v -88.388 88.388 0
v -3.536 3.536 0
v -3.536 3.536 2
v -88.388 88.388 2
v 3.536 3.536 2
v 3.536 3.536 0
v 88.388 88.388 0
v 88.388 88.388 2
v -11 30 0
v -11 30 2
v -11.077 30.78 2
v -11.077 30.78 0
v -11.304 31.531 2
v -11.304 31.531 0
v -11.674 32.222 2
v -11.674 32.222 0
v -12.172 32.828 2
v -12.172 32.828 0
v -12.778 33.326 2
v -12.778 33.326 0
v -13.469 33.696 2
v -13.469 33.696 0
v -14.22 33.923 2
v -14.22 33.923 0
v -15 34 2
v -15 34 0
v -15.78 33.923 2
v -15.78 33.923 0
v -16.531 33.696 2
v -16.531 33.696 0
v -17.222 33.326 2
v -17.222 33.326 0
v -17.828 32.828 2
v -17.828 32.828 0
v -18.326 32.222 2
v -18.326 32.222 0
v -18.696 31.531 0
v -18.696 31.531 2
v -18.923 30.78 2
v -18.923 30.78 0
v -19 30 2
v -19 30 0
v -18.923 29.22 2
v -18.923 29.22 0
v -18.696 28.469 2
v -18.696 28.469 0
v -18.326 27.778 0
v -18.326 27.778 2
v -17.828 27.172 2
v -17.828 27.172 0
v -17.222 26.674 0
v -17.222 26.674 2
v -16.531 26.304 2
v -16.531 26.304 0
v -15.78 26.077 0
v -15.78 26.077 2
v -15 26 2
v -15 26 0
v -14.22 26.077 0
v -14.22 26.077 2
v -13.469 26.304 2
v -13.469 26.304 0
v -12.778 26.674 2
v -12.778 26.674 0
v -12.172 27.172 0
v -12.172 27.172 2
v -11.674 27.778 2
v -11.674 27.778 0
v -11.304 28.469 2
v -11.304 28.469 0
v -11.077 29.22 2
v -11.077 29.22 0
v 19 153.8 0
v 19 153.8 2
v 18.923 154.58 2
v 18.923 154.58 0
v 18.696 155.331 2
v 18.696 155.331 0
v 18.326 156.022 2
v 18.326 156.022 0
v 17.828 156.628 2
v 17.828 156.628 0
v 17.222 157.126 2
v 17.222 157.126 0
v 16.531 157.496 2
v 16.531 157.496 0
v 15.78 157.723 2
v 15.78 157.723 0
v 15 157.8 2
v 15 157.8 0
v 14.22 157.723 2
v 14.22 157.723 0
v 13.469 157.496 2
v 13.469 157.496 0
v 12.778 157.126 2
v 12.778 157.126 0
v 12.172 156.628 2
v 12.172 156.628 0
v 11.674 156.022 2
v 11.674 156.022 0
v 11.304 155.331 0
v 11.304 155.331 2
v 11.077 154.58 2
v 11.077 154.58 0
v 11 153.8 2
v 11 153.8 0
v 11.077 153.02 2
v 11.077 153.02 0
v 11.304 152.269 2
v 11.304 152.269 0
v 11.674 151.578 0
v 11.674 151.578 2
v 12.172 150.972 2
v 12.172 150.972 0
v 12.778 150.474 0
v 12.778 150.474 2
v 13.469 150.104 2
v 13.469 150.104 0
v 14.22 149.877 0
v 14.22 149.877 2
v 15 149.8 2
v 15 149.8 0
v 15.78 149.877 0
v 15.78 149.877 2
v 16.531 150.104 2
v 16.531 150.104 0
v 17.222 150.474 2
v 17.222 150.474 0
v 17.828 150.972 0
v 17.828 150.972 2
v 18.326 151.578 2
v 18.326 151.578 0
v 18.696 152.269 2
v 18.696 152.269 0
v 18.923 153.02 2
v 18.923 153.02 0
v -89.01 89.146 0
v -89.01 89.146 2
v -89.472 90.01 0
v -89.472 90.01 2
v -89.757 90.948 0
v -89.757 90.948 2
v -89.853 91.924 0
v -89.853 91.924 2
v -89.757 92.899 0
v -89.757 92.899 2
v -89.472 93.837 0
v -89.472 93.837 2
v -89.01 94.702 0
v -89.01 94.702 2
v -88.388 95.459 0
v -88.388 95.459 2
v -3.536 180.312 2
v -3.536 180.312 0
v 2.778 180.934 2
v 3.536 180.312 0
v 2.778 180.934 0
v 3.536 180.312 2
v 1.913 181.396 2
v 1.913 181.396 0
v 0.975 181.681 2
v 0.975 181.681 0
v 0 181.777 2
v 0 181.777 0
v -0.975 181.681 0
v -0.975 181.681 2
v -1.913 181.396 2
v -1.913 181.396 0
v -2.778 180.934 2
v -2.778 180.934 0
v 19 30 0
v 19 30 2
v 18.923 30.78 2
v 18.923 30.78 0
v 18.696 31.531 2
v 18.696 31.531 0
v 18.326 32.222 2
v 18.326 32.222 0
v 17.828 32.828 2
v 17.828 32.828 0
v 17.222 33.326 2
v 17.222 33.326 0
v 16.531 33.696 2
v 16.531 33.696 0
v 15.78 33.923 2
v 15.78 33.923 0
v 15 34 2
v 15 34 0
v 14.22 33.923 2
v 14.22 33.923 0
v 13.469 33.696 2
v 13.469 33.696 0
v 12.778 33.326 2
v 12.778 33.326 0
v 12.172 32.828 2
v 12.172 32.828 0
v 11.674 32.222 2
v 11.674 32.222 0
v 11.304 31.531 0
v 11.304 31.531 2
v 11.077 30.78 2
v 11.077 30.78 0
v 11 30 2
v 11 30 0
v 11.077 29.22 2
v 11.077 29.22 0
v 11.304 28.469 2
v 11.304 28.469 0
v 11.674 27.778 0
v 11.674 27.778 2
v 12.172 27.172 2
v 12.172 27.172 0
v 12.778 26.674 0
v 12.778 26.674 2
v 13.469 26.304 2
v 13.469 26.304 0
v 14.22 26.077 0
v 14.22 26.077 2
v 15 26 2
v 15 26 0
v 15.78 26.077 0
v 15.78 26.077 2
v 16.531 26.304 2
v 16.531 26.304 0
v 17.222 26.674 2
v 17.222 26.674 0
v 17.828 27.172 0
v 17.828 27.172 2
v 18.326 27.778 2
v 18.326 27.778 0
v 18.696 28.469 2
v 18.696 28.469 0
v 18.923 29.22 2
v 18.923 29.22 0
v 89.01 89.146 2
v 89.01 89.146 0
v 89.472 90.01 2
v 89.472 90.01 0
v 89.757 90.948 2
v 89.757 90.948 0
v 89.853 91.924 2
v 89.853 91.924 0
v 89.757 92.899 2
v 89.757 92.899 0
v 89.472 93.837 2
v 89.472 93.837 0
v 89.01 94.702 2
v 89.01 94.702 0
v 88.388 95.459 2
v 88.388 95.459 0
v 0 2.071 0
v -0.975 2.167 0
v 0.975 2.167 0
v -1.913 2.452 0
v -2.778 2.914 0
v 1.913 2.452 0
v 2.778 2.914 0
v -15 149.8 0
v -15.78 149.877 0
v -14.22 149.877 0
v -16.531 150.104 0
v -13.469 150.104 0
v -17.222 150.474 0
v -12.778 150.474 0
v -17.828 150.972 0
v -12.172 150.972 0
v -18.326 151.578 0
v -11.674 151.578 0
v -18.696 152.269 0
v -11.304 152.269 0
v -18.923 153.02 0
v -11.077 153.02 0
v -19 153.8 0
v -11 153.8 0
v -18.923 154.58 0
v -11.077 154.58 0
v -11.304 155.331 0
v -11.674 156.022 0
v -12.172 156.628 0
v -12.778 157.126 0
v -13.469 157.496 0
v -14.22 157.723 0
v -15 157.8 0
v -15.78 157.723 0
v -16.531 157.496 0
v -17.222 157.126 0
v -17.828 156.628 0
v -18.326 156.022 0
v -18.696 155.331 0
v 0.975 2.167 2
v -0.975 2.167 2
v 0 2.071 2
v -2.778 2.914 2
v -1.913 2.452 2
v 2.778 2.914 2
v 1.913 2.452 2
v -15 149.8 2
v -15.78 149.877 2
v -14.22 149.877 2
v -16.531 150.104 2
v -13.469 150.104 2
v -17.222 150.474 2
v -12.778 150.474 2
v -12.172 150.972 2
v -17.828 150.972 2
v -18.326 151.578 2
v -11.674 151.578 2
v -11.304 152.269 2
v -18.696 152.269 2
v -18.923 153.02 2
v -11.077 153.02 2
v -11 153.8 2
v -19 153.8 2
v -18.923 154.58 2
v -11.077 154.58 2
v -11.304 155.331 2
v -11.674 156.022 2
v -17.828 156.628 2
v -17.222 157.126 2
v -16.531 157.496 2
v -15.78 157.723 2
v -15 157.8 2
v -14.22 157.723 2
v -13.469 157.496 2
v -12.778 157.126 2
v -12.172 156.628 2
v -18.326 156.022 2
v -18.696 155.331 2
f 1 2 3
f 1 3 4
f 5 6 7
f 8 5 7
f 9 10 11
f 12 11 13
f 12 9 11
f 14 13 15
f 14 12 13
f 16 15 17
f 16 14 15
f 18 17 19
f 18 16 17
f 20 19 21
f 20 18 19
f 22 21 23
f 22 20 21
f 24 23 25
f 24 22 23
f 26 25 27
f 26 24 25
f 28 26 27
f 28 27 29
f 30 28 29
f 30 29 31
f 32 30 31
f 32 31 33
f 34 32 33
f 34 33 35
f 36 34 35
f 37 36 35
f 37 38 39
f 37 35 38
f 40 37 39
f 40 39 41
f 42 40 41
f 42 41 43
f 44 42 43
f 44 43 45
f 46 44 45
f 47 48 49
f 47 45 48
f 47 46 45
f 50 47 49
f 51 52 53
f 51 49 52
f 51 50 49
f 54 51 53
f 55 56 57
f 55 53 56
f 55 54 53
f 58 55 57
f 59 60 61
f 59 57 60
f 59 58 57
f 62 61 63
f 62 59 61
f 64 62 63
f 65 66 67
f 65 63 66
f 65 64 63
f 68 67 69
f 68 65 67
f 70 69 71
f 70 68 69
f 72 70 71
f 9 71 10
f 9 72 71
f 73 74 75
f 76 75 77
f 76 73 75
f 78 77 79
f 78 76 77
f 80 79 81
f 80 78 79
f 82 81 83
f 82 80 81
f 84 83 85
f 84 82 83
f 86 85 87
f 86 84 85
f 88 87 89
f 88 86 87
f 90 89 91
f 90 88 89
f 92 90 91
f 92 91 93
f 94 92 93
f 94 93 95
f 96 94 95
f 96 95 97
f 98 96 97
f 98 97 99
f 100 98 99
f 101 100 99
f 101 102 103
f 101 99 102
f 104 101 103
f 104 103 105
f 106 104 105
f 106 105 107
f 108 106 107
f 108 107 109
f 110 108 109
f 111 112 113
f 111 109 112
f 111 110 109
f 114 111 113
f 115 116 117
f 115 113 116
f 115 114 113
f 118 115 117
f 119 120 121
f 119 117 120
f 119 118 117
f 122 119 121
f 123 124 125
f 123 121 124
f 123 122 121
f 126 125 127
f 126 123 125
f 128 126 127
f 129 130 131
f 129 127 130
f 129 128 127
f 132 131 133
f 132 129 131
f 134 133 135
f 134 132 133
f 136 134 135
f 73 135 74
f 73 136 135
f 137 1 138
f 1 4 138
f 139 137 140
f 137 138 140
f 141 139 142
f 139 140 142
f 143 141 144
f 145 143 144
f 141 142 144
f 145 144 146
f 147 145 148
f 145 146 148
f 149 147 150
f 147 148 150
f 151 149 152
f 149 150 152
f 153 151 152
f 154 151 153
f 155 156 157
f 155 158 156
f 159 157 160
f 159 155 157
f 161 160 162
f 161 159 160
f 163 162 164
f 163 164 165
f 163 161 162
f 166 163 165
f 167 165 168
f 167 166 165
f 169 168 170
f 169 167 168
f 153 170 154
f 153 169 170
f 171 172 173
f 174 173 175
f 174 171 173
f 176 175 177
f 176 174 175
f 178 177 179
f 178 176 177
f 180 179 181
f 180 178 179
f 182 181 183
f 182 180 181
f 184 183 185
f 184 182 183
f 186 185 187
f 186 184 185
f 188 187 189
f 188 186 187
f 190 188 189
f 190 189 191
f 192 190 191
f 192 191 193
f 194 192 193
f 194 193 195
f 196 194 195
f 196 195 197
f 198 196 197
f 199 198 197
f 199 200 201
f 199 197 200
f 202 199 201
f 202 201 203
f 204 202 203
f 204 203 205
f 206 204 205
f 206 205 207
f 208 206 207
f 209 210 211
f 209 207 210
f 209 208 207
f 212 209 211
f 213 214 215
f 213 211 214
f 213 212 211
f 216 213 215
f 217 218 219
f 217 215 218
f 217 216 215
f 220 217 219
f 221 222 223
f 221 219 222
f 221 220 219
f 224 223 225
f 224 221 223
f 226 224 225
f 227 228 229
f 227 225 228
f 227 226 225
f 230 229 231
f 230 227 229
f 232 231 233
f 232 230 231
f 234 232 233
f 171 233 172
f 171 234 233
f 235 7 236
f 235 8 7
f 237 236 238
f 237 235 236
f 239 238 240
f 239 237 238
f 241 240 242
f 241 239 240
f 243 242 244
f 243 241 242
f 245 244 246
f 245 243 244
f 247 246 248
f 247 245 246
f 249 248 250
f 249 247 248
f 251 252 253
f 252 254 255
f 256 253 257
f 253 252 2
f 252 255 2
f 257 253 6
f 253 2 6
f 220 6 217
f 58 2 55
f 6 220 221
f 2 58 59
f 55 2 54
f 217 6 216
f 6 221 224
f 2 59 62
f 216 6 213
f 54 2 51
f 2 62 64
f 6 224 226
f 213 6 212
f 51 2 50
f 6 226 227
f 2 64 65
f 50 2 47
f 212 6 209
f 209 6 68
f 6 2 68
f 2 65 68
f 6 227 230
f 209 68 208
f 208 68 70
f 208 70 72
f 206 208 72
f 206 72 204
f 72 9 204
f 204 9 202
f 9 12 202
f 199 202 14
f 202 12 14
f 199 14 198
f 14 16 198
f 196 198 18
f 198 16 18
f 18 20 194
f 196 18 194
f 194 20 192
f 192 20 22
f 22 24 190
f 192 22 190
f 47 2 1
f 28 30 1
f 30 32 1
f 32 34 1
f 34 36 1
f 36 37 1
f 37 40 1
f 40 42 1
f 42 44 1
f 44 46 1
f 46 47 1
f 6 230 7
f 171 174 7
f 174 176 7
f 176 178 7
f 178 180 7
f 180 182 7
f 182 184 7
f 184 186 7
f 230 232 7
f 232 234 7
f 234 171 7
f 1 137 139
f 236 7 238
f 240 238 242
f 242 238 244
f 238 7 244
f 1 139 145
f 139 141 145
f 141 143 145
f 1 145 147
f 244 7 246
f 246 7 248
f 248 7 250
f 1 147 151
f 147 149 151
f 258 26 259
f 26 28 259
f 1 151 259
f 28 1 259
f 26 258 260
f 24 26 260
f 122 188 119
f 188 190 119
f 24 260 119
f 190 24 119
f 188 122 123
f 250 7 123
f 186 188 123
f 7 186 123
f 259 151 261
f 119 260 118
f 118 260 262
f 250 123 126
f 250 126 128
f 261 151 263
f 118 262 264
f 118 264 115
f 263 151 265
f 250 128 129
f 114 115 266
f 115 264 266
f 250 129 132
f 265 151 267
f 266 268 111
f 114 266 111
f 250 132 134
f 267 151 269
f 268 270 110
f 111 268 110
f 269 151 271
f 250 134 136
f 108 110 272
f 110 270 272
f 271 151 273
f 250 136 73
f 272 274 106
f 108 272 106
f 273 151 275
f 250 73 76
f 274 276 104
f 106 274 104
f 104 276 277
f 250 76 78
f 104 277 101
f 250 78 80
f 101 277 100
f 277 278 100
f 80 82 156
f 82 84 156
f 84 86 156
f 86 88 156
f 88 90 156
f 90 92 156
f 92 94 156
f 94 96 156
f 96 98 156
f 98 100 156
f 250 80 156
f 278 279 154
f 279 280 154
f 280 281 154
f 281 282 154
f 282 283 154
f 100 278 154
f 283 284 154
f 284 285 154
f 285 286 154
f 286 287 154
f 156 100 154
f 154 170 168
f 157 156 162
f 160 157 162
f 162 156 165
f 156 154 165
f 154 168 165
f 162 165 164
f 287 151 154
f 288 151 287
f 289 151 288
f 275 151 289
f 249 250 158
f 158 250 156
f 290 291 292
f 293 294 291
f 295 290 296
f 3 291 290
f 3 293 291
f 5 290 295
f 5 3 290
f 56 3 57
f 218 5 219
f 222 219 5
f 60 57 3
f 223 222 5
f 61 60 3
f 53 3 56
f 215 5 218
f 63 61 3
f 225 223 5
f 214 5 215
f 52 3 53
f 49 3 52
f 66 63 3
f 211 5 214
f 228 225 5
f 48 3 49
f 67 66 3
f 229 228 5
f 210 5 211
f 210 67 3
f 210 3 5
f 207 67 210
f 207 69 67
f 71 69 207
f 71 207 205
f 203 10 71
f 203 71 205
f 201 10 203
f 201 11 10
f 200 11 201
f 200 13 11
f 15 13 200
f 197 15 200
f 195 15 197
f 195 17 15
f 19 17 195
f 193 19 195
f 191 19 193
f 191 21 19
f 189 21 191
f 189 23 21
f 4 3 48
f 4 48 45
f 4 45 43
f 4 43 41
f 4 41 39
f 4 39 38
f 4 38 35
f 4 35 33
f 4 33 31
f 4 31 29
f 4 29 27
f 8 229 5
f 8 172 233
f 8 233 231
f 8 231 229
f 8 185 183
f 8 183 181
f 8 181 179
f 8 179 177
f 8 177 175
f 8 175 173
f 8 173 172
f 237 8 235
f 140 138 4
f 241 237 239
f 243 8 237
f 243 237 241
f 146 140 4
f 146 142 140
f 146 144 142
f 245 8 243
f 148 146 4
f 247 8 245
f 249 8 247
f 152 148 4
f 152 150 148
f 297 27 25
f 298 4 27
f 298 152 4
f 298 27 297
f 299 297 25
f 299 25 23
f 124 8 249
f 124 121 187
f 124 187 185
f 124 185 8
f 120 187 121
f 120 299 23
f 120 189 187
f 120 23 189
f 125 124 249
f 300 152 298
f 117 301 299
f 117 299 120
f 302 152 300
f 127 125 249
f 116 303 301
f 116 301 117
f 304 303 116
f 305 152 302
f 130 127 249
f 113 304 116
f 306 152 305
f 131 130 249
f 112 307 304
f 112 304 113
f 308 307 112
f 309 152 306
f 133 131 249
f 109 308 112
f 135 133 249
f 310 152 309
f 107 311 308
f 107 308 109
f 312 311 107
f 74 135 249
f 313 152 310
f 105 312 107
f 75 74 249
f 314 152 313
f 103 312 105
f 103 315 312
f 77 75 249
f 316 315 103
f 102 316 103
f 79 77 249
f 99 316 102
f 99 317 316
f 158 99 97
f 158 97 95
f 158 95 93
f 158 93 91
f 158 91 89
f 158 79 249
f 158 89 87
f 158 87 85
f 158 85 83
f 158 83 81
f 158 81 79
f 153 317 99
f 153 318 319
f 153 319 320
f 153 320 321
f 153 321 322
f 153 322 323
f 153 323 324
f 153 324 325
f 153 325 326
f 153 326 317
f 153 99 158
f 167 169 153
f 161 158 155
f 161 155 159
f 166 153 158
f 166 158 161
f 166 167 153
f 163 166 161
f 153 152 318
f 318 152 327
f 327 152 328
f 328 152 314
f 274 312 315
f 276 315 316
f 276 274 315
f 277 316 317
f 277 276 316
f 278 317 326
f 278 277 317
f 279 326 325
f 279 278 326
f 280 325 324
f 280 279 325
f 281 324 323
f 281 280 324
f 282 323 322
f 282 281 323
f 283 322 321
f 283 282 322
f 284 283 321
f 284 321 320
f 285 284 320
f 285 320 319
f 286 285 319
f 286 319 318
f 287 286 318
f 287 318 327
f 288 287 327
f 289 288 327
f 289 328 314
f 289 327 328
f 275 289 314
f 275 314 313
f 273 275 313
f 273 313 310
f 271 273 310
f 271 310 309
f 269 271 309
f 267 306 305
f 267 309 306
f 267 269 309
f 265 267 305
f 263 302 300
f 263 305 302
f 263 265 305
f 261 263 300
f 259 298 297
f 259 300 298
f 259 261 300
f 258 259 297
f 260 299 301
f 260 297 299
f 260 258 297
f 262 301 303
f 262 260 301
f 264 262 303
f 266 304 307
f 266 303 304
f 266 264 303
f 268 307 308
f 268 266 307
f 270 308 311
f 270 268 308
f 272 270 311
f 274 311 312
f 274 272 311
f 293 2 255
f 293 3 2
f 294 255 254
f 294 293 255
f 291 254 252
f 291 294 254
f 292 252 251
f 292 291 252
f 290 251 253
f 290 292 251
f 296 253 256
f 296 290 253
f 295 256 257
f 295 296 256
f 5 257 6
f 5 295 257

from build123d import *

# Parameters (mm, degrees)
CYLINDER_R             = 4
CYLINDER_DEPTH         = 10
CYLINDER001_R          = 4
CYLINDER001_DEPTH      = 10
CYLINDER002_R          = 4
CYLINDER002_DEPTH      = 10
CYLINDER003_R          = 4
CYLINDER003_DEPTH      = 10
BOX_W                  = 130
BOX_H                  = 130
BOX_DEPTH              = 2
FILLET_R               = 5
FILLET_PLACEMENT_ANGLE = 45


with BuildPart() as cylinder:
    # Cylinder → Cylinder (new body)
    with BuildSketch(Plane(origin=(15, 30, 0), x_dir=(1, 0, 0), z_dir=(0, 0, 1))):
        Circle(CYLINDER_R)
    extrude(amount=CYLINDER_DEPTH)


with BuildPart() as cylinder001:
    # Cylinder001 → Cylinder001 (new body)
    with BuildSketch(Plane(origin=(-15, 30, 0), x_dir=(1, 0, 0), z_dir=(0, 0, 1))):
        Circle(CYLINDER001_R)
    extrude(amount=CYLINDER001_DEPTH)


with BuildPart() as cylinder002:
    # Cylinder002 → Cylinder002 (new body)
    with BuildSketch(Plane(origin=(-15, 153.8, 0), x_dir=(1, 0, 0), z_dir=(0, 0, 1))):
        Circle(CYLINDER002_R)
    extrude(amount=CYLINDER002_DEPTH)


with BuildPart() as fusion:
    # Cylinder003 → Cylinder003 (new body)
    with BuildSketch(Plane(origin=(15, 153.8, 0), x_dir=(1, 0, 0), z_dir=(0, 0, 1))):
        Circle(CYLINDER003_R)
    extrude(amount=CYLINDER003_DEPTH)

    # Fusion: union Cylinder, Cylinder001, Cylinder002
    add(cylinder.part)
    add(cylinder001.part)
    add(cylinder002.part)


with BuildPart() as cut:
    # Box → Box (new body)
    with BuildSketch(Plane.XY):
        with Locations((65, 65)):
            Rectangle(BOX_W, BOX_H)
    extrude(amount=BOX_DEPTH)

    # Fillet
    fillet_edges = [cut.edges().sort_by_distance(p)[0] for p in [
        (0, 0, 1),
        (0, 130, 1),
        (130, 0, 1),
        (130, 130, 1),
    ]]
    fillet(fillet_edges, radius=FILLET_R)


with BuildPart() as cut_1:
    # Fillet placement: moved
    add(cut.part.rotate(Axis((0, 0, 0), (0, 0, 1)), FILLET_PLACEMENT_ANGLE))

    # Cut: cut Fusion
    add(fusion.part, mode=Mode.SUBTRACT)


solid = cut_1.part
